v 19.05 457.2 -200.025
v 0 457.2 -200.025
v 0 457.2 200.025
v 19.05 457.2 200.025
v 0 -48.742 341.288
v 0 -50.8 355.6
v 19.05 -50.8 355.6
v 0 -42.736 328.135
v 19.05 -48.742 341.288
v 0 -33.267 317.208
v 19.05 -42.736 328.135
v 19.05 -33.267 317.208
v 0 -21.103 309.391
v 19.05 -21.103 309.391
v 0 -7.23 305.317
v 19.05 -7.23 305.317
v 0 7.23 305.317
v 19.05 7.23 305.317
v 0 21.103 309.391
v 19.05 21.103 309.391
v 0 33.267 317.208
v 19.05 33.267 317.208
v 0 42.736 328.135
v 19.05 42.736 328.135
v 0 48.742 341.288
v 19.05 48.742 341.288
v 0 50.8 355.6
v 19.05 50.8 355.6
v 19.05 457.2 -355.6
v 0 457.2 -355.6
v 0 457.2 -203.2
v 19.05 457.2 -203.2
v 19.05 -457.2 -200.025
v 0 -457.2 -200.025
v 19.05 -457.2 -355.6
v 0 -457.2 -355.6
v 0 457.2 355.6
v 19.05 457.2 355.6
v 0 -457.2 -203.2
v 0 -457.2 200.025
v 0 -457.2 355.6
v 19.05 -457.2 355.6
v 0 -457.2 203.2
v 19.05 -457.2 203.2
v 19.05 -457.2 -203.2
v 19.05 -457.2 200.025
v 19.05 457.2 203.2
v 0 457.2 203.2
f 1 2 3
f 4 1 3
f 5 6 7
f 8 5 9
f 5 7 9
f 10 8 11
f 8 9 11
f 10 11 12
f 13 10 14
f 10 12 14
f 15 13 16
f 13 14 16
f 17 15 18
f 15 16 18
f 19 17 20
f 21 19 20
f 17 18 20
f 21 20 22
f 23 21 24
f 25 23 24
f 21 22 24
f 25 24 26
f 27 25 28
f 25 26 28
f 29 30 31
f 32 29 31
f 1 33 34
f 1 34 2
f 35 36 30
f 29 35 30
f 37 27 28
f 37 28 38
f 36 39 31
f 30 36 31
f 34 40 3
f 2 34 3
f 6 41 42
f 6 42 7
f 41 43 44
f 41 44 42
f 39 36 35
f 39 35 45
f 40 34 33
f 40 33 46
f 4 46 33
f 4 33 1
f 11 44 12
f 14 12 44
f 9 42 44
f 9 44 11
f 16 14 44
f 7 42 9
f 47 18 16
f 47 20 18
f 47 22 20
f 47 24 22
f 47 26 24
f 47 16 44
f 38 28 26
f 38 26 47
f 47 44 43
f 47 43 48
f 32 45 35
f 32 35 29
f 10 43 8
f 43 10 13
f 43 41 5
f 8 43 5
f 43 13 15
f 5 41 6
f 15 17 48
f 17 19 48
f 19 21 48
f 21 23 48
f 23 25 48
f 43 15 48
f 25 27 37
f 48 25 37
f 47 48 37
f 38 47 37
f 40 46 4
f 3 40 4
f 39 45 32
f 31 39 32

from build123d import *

# Parameters (mm, degrees)
F0_W     = 914.4
F0_H     = 711.2
F1_DEPTH = 19.05
F3_DEPTH = 25.4
F4_W     = 914.4
F4_H     = 3.175
F5_DEPTH = 25.4


with BuildPart() as f1:
    # F0 (on Right) → F1 (new body)
    with BuildSketch(Plane.YZ):
        Rectangle(F0_W, F0_H)
    extrude(amount=F1_DEPTH)

    # F2 (on face) → F3 (cut)
    with BuildSketch(Plane.YZ.offset(19.05)):
        with BuildLine():
            ThreePointArc((-50.8, 355.6), (0, 304.8), (50.8, 355.6))
            Line((50.8, 355.6), (-50.8, 355.6))
        make_face()
    extrude(amount=-F3_DEPTH, mode=Mode.SUBTRACT)

    # F4 (on face) → F5 (cut)
    with BuildSketch(Plane.YZ.offset(19.05)):
        with Locations((0, 201.6125)):
            Rectangle(F4_W, F4_H)
        with Locations((0, -201.6125)):
            Rectangle(F4_W, F4_H)
    extrude(amount=-F5_DEPTH, mode=Mode.SUBTRACT)


solid = f1.part
